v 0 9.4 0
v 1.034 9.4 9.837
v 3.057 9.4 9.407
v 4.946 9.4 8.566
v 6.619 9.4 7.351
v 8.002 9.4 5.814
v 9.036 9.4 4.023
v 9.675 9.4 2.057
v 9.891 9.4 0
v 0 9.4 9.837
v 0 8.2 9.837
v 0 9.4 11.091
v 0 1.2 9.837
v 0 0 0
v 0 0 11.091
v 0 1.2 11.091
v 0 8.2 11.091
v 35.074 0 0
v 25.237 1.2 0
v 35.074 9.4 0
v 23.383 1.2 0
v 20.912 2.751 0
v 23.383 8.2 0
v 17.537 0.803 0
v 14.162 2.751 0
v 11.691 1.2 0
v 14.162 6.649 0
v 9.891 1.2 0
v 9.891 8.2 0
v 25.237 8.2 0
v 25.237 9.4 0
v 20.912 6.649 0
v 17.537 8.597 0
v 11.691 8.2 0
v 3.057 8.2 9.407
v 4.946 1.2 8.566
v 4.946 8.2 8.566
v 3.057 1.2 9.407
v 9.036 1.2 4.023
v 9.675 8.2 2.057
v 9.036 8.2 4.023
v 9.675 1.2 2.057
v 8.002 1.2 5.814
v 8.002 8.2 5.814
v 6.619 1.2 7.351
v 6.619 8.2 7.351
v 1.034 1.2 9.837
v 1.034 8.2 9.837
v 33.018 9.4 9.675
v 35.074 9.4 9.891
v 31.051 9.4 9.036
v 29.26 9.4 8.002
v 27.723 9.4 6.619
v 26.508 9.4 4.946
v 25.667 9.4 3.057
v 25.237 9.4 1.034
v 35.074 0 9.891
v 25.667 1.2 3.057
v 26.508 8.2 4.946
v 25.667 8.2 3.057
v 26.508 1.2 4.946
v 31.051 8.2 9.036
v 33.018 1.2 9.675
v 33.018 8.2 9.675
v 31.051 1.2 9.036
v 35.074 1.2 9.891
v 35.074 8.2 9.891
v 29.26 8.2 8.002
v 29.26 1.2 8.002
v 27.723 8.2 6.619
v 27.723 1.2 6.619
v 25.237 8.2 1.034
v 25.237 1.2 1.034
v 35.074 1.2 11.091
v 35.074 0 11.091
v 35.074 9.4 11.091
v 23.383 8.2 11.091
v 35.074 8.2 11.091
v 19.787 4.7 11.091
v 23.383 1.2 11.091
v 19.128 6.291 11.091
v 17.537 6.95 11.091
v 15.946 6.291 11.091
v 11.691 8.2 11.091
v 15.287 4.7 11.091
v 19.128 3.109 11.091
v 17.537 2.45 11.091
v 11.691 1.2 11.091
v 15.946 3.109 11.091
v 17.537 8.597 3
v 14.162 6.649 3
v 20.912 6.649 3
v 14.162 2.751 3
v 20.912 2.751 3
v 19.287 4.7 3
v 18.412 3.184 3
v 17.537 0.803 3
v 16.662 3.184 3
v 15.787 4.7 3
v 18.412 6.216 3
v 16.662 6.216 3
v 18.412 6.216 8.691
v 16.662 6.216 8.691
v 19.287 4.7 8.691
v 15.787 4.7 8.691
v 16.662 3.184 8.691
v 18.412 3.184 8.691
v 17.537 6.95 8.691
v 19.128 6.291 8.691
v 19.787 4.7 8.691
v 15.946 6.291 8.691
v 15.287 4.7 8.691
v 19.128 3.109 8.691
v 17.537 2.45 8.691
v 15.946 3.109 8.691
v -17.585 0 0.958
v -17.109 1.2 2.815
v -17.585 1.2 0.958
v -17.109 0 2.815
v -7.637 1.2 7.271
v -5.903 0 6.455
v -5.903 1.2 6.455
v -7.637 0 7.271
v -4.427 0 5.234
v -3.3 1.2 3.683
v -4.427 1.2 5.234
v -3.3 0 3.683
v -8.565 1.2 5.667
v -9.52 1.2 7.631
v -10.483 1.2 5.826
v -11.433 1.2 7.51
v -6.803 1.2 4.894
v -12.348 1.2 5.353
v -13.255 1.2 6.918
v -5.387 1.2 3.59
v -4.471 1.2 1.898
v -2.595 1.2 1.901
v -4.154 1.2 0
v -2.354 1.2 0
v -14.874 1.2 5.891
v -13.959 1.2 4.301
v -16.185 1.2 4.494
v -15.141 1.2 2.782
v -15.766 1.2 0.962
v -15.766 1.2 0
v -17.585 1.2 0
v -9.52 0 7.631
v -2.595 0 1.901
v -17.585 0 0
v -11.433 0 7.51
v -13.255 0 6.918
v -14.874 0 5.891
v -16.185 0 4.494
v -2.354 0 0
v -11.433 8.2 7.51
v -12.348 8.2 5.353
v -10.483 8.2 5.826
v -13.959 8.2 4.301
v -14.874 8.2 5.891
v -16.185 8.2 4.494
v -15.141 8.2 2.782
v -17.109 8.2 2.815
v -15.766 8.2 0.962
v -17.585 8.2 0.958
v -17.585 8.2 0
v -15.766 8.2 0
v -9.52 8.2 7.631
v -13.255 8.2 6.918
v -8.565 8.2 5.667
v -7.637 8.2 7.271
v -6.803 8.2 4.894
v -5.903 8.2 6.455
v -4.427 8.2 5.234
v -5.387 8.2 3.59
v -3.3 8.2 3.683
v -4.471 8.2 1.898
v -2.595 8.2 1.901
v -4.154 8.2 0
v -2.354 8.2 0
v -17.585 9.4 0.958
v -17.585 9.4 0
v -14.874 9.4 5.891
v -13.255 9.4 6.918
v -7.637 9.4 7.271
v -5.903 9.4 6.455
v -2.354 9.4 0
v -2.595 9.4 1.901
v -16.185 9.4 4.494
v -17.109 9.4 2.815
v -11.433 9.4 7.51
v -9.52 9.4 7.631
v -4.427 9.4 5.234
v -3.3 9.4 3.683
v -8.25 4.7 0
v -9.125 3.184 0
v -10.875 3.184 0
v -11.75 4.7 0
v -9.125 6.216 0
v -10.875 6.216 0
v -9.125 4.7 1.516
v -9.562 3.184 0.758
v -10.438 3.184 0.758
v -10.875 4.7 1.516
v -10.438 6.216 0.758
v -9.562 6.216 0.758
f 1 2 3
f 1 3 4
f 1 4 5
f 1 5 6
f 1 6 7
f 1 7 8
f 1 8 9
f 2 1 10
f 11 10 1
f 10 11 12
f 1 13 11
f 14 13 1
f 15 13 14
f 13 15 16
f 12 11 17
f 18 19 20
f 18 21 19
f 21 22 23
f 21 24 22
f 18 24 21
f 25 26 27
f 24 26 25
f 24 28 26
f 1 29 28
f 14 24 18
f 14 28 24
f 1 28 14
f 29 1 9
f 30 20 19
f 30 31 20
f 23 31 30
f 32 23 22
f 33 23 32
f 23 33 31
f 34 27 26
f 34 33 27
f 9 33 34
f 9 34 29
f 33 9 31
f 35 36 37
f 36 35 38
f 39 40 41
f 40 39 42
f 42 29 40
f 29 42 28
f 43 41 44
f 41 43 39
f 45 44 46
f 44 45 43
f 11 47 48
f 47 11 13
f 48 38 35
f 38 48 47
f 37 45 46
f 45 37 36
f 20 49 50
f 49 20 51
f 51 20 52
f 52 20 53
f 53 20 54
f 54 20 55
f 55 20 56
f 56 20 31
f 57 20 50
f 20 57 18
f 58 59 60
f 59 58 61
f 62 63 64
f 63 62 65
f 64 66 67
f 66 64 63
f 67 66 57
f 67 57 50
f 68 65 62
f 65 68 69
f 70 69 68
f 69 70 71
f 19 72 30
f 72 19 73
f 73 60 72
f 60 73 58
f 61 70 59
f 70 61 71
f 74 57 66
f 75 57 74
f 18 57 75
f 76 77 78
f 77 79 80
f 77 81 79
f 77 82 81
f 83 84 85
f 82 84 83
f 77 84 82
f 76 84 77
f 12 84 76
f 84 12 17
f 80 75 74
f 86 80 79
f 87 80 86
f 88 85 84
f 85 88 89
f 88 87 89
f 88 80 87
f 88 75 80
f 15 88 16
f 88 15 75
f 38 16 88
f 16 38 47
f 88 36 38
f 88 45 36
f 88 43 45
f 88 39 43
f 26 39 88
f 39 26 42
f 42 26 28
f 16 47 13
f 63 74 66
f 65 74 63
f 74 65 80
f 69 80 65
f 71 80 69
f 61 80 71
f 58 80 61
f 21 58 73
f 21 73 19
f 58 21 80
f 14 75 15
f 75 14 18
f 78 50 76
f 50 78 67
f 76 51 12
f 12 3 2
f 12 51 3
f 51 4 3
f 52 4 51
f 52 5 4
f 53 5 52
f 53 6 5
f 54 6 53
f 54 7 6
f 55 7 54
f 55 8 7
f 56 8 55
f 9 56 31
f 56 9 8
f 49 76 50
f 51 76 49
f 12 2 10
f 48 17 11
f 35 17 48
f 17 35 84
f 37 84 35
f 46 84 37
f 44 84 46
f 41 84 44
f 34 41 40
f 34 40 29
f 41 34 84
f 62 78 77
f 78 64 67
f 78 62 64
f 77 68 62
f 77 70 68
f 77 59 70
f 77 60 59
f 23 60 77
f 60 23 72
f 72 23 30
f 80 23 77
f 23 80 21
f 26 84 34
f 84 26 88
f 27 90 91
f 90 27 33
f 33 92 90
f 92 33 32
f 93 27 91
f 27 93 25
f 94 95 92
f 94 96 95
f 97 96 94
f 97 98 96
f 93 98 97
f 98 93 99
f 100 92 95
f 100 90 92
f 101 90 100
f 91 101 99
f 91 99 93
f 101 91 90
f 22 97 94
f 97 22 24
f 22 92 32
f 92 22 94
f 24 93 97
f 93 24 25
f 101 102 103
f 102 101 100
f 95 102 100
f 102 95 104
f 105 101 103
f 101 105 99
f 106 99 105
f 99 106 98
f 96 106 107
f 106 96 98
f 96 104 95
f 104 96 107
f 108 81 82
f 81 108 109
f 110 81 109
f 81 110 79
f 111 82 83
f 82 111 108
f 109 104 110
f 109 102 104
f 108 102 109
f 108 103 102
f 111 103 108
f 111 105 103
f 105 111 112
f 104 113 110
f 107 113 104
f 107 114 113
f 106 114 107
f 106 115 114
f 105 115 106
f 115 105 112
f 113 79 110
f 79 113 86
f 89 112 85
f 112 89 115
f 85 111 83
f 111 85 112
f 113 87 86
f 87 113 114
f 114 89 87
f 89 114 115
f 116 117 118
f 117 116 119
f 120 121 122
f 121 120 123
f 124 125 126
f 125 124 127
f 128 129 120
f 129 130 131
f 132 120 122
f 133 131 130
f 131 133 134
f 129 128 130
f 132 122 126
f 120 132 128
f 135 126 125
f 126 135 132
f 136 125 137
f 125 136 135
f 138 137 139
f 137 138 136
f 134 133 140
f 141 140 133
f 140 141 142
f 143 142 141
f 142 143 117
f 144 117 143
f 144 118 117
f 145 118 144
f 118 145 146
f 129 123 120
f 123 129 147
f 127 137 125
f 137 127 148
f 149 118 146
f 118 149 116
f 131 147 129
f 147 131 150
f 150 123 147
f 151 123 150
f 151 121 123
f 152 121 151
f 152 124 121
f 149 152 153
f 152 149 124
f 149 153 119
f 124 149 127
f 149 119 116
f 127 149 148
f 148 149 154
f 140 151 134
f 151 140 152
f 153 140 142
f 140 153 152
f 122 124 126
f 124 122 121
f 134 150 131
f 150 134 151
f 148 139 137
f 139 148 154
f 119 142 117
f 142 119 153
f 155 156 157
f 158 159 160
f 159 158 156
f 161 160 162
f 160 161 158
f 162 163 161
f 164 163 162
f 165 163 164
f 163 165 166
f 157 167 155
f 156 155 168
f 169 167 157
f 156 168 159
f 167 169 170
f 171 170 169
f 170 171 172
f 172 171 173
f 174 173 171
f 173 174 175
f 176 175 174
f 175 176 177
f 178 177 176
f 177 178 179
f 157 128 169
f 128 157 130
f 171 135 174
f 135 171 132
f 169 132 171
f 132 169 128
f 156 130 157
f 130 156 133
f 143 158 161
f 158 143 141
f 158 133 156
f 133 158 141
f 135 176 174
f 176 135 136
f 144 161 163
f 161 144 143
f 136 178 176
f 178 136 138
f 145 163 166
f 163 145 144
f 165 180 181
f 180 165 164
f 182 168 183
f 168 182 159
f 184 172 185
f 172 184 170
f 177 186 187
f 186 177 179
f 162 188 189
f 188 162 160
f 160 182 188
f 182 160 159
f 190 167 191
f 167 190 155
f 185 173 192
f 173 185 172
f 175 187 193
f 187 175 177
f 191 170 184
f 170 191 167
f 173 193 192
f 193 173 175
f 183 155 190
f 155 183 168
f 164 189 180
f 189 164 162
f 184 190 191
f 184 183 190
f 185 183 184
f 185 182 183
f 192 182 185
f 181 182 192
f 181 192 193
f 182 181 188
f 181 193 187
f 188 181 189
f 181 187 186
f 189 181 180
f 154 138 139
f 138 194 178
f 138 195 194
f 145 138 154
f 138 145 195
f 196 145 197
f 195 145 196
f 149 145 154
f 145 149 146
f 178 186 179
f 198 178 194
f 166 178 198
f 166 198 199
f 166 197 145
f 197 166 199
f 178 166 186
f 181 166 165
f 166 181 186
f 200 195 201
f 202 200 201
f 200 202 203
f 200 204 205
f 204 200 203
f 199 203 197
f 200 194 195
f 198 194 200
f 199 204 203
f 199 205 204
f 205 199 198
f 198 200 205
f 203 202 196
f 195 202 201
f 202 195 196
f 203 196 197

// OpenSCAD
//Wrench size of the nut
NutWrenchSize=4.5;

//Nut Height
NutHeight=3;

//Diameter of bolt 
Diameter=3.5;

//Nut to wall ratio
NutFixingRatio=1.5;

//Bolt Head diameter
BoltHeadD=4.5;

//Bolt Head Height
BoltHeadH=3;

//Belt Width
BeltWidth=7;

//Belt Height
BeltHeight=1.8;

//Wall thickness
Wall=1.2;

//Open option
IsOpen=false;

module pole(r,h){
    intersection(){
        cube([r,r,h]);
        cylinder(r=r,h=h);
    }
}

module frame(l,w, wall=2,space=2){
    r= l/3-space;
    h=r+wall;
    union() {
        cube([l,wall,h]);
        translate([0,w-wall,0]) cube([l,wall,h]);
        translate([0,w,0]) rotate([90,0,0]) pole(r,w);
        translate([l,w,0]) rotate([90,-90,0]) pole(r,w);
        translate([l/3,0,0]) cube([l/3,w,h]);
    }
}

module part1(nws,nh,nsr,w1d,w2d,w2h,bw,bh){
    wall=Wall;
    nd=nws*3/sqrt(3);
    w=bw+wall*2;
    difference(){
        frame((nd*nsr)*3,w, wall, bh);
        translate([(nd*nsr)*1.5,w/2,0]) rotate([0,0,30]) cylinder(d=nd,h=nh,$fn=6);
        translate([(nd*nsr)*1.5,w/2,0]) cylinder(d=w1d,h=(nd*nsr));
        translate([(nd*nsr)*1.5,w/2,(nd*nsr)-w2h]) cylinder(d=w2d,h=w2h);
        if(IsOpen){
            translate([(nd*nsr)-bh,0,0]) cube([bh,Wall,(nd*nsr)]);
            translate([(nd*nsr)*2,0,0]) cube([bh,Wall,(nd*nsr)]);
        }
    }
}

module part2(nws,nsr,w1d,bw,bh){
    nd=nws*3/sqrt(3);
    l=nd*nsr;
    difference(){
        union(){
            translate([0,0,-Wall]) cylinder(d=l+bh*2,h=Wall);
            cylinder(d=l,h=bw);
            translate([0,0,bw]) cylinder(d=l+bh*2,h=Wall);
        }
        translate([-(l+bh*2)/2,0,-Wall]) cube([l+bh*2,(l+bh*2)/2,bw+2*Wall]);
        translate([0,0,bw/2]) sphere(d=w1d);
    }
}

part1(NutWrenchSize,NutHeight,NutFixingRatio,Diameter,BoltHeadD,BoltHeadH,BeltWidth,BeltHeight);
translate([-BeltWidth-3,Wall,0]) rotate([-90,0,0])
part2(NutWrenchSize,NutFixingRatio,Diameter,BeltWidth,BeltHeight);
